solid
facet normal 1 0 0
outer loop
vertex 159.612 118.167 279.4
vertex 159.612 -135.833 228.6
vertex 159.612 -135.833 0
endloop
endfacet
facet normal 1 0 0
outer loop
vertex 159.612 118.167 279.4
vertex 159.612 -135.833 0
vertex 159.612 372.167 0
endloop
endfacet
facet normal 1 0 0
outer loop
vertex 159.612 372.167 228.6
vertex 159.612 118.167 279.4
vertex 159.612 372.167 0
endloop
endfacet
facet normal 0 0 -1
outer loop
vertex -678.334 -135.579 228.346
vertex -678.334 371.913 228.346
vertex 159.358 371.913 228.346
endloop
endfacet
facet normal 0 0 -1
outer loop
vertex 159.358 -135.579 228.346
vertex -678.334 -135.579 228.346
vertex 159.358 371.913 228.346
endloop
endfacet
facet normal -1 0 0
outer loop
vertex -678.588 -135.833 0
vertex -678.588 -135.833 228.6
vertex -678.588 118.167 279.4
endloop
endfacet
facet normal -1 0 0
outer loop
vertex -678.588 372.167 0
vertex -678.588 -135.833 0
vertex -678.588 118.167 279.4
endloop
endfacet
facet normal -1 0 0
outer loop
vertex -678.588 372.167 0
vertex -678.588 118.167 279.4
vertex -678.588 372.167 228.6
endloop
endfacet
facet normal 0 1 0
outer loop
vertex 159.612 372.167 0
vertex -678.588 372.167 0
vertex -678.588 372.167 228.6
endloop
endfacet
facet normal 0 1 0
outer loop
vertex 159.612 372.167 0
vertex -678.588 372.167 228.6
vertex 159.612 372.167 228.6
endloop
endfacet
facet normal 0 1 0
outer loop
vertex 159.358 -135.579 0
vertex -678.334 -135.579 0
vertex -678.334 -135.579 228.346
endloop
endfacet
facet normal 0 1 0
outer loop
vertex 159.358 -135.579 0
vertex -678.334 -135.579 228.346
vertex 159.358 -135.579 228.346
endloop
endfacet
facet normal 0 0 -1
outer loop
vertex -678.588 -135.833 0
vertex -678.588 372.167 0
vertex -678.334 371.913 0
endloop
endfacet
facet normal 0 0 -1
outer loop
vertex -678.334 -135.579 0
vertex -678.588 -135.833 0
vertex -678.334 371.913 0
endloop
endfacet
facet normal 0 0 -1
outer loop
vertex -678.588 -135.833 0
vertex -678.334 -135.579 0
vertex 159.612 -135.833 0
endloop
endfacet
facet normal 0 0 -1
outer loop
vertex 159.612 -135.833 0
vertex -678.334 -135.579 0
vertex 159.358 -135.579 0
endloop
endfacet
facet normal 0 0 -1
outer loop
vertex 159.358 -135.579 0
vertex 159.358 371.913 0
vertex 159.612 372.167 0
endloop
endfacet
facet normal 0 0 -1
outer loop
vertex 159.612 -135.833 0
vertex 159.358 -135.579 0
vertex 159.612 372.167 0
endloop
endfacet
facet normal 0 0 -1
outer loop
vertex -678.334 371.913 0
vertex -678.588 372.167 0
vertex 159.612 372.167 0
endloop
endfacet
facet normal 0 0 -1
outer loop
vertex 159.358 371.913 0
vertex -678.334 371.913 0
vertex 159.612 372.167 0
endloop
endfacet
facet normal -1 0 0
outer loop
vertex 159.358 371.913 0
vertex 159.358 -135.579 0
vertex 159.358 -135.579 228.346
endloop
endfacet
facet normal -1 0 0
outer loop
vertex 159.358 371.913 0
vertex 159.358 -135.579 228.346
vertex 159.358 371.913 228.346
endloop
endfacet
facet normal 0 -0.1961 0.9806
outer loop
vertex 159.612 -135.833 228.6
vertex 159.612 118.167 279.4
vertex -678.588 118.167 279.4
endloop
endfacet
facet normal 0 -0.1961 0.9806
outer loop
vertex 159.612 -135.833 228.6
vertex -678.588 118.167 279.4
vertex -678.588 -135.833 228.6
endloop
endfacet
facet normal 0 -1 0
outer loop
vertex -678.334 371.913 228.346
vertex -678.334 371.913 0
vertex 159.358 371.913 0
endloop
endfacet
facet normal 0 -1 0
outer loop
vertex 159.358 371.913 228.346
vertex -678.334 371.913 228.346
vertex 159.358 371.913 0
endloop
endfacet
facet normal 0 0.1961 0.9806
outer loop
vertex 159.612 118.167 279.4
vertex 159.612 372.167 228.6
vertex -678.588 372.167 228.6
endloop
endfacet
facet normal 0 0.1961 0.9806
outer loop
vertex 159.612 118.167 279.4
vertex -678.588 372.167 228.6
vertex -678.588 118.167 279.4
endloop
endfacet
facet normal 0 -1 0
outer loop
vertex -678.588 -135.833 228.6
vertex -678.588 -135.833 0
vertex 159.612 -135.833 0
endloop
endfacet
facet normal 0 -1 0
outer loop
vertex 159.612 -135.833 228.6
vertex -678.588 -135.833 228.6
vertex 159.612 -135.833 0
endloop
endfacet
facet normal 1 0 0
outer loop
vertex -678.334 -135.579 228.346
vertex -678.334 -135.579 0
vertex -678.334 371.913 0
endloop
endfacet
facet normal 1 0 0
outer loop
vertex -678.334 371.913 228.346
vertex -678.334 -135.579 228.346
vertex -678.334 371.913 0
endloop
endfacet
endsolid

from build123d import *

# Parameters (mm, degrees)
F0_W     = 838.2
F0_H     = 508
F0_W_2   = 685.8
F0_H_2   = 355.6
F1_DEPTH = 228.6
F2_T     = -0.254
F4_DEPTH = 838.2


with BuildPart() as f1:
    # F0 (on Top) → F1 (new body)
    with BuildSketch(Plane.XY):
        with Locations((-259.4876274824, 118.1668707132)):
            Rectangle(F0_W, F0_H)
        with Locations((-259.4876274824, 118.1668707132)):
            Rectangle(F0_W_2, F0_H_2, mode=Mode.SUBTRACT)
        with Locations((-259.4876274824, 118.1668707132)):
            Rectangle(F0_W_2, F0_H_2)
    extrude(amount=F1_DEPTH)

    # F2
    f2_openings = [f1.faces().sort_by_distance(p)[0] for p in [
        (-259.487627, 118.166871, 0),
    ]]
    offset(amount=F2_T, openings=f2_openings)

    # F3 (on face) → F4 (join)
    with BuildSketch(Plane.YZ.offset(159.6123725176)):
        Polygon((118.1668707132, 279.4), (-135.8331292868, 228.6), (118.1668707132, 228.6), align=None)
        Polygon((118.1668707132, 279.4), (118.1668707132, 228.6), (372.1668707132, 228.6), align=None)
    extrude(amount=-F4_DEPTH)


solid = f1.part
